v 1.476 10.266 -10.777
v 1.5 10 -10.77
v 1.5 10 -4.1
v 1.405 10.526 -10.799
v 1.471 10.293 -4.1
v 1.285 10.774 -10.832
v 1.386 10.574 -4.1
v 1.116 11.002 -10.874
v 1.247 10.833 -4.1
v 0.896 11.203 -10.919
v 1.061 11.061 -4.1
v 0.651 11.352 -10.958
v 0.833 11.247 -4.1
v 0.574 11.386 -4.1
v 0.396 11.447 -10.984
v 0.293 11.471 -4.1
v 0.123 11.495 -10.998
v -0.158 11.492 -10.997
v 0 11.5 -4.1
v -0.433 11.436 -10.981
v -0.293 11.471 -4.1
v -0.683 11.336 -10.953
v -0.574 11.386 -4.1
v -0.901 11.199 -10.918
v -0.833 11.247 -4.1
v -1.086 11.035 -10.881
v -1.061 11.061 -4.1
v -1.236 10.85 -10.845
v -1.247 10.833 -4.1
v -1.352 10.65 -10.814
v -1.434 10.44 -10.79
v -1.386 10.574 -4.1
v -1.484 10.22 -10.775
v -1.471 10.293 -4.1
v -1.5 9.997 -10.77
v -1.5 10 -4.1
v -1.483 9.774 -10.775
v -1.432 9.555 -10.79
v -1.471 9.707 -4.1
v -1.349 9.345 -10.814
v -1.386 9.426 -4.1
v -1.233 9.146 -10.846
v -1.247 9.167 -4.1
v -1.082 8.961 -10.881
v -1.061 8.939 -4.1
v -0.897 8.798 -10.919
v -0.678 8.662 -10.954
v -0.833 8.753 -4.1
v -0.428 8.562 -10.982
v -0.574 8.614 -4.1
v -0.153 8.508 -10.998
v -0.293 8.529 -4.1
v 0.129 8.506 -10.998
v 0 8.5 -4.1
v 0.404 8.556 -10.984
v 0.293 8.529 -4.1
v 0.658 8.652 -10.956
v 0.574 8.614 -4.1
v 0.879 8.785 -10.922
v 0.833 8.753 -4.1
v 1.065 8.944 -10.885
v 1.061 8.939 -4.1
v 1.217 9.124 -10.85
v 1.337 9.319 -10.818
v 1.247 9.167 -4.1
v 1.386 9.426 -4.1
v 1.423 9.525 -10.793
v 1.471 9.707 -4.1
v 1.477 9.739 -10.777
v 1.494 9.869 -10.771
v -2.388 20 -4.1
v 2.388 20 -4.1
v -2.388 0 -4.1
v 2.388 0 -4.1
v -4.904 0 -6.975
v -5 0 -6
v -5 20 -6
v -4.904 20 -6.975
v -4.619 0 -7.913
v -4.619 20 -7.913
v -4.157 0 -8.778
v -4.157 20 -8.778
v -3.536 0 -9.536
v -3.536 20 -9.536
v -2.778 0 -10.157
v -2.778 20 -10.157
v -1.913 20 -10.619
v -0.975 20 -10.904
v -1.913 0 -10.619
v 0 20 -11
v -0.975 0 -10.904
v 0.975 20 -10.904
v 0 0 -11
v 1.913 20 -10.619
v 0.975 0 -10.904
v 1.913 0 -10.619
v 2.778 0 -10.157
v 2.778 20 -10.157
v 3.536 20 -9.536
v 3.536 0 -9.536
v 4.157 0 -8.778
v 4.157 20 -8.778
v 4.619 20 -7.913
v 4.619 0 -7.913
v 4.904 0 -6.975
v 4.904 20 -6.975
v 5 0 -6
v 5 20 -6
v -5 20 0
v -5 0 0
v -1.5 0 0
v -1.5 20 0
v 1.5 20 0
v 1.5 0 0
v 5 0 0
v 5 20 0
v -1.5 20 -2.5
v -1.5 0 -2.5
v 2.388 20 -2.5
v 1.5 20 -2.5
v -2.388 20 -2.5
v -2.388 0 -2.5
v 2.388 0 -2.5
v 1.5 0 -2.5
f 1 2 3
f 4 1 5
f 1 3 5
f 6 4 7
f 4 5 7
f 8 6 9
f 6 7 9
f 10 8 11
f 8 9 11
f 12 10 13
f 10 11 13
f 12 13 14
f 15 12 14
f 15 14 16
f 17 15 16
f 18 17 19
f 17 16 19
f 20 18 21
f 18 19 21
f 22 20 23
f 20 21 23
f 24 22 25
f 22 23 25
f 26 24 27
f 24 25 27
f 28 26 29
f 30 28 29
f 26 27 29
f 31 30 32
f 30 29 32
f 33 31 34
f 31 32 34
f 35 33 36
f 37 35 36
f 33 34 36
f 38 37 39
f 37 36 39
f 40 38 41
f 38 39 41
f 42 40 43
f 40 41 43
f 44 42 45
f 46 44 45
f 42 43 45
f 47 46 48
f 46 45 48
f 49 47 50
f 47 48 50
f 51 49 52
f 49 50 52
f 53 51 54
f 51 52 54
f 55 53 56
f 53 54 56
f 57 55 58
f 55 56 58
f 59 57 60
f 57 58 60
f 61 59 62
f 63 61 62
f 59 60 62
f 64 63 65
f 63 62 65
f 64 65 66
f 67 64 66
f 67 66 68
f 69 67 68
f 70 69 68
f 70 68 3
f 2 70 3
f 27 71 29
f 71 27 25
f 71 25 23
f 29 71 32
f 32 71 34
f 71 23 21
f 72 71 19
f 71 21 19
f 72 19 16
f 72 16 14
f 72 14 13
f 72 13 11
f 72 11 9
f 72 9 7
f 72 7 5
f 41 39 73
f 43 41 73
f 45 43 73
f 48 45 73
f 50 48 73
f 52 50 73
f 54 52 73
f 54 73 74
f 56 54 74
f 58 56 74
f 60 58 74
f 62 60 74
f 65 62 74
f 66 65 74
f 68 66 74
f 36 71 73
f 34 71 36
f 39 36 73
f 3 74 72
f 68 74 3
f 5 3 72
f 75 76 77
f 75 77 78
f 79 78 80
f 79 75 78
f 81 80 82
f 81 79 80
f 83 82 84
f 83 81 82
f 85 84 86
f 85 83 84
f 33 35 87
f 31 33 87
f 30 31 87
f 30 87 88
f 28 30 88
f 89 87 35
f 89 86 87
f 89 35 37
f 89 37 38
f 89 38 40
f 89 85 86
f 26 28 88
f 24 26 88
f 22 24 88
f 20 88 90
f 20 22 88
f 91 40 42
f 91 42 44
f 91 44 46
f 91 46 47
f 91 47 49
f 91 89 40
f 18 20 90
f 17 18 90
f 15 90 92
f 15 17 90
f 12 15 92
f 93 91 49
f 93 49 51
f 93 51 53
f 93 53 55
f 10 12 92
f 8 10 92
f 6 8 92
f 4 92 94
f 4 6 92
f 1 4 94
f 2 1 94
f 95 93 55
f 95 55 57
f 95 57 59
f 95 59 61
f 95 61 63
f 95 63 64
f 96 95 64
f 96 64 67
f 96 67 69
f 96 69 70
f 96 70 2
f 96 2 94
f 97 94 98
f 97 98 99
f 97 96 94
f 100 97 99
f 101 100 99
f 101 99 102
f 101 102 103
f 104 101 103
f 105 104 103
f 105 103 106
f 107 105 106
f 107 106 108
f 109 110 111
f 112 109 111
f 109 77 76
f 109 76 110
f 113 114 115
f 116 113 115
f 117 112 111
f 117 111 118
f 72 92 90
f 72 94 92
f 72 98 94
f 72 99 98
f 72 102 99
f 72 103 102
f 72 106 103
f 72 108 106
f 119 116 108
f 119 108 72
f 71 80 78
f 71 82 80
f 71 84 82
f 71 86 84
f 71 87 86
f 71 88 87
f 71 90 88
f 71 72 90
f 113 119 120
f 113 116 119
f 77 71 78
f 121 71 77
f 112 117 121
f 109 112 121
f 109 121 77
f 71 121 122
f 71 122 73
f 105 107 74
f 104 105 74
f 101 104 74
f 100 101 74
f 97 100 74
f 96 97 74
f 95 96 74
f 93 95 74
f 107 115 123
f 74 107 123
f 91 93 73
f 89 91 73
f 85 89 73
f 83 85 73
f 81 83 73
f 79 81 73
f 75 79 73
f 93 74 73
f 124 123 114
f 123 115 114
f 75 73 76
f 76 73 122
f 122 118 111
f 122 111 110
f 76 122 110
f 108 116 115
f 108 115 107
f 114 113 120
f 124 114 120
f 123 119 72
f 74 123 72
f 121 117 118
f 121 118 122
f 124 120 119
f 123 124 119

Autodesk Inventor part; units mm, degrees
ref_plane "YZ Plane" through (0, 0, 0) normal (1, 0, 0) x (0, 1, 0)
ref_plane "XZ Plane" through (0, 0, 0) normal (0, 1, 0) x (-1, 0, 0)
ref_plane "XY Plane" through (0, 0, 0) normal (0, 0, 1) x (1, 0, 0)
sketch "Sketch1" plane through (0, 0, 0) normal (0, 1, 0) x (-1, 0, 0)
  line L0 (7, 0) -> (-7, 0) projected
  line L1 (0, -13.2) -> (0, 2.2) projected
  line L2 (-5, 0) -> (-5, -6)
  line L3 (5, -6) -> (5, 0)
  line L4 (1.5, 0) -> (1.5, -2.5)
  line L5 (1.5, -2.5) -> (2.3876, -2.5)
  line L6 (2.3876, -2.5) -> (2.3876, -4.1002)
  line L7 (2.3876, -4.1002) -> (0, -4.1002)
  line L8 (-1.5, 0) -> (-1.5, -2.5)
  line L9 (-1.5, -2.5) -> (-2.3876, -2.5)
  line L10 (-2.3876, -2.5) -> (-2.3876, -4.1002)
  line L11 (-2.3876, -4.1002) -> (0, -4.1002)
  line L12 (5, 0) -> (1.5, 0)
  line L13 (-1.5, 0) -> (-5, 0)
  arc A0 (-5, -6) -> (5, -6) centre (0, -6) ccw
  point P0 (0, 0)
  dimension "d0" = 10
  dimension "d1" = 5
  dimension "d3" = 2.3876
  dimension "d4" = 1.6002
  dimension "d5" = 2.5
  dimension "d6" = 1.5
  dimension "d7" = 6
  dimension "d8" = 5
extrude "Extrusion1" add sketch "Sketch1" along normal blind 20 contours L3 A0 L1 L7 L6 L5 L4 L0 | A0 L2 L0 L8 L9 L10 L11 L1
sketch "Sketch2" plane through (-2.3876, 0, -4.1002) normal (0, 0, 1) x (1, 0, 0)
  line L0 (2.3876, 0) -> (2.3876, 20) construction
  line L1 (7.3876, 20) -> (-2.6124, 20) projected
  circle A0 centre (2.3876, 10) radius 1.5
  dimension "d11" = 3
extrude "Extrusion2" cut sketch "Sketch2" against normal blind 20
equation "\"d1\" = 0.5 * d0"
properties part number "BallBallerina_StopHead"
